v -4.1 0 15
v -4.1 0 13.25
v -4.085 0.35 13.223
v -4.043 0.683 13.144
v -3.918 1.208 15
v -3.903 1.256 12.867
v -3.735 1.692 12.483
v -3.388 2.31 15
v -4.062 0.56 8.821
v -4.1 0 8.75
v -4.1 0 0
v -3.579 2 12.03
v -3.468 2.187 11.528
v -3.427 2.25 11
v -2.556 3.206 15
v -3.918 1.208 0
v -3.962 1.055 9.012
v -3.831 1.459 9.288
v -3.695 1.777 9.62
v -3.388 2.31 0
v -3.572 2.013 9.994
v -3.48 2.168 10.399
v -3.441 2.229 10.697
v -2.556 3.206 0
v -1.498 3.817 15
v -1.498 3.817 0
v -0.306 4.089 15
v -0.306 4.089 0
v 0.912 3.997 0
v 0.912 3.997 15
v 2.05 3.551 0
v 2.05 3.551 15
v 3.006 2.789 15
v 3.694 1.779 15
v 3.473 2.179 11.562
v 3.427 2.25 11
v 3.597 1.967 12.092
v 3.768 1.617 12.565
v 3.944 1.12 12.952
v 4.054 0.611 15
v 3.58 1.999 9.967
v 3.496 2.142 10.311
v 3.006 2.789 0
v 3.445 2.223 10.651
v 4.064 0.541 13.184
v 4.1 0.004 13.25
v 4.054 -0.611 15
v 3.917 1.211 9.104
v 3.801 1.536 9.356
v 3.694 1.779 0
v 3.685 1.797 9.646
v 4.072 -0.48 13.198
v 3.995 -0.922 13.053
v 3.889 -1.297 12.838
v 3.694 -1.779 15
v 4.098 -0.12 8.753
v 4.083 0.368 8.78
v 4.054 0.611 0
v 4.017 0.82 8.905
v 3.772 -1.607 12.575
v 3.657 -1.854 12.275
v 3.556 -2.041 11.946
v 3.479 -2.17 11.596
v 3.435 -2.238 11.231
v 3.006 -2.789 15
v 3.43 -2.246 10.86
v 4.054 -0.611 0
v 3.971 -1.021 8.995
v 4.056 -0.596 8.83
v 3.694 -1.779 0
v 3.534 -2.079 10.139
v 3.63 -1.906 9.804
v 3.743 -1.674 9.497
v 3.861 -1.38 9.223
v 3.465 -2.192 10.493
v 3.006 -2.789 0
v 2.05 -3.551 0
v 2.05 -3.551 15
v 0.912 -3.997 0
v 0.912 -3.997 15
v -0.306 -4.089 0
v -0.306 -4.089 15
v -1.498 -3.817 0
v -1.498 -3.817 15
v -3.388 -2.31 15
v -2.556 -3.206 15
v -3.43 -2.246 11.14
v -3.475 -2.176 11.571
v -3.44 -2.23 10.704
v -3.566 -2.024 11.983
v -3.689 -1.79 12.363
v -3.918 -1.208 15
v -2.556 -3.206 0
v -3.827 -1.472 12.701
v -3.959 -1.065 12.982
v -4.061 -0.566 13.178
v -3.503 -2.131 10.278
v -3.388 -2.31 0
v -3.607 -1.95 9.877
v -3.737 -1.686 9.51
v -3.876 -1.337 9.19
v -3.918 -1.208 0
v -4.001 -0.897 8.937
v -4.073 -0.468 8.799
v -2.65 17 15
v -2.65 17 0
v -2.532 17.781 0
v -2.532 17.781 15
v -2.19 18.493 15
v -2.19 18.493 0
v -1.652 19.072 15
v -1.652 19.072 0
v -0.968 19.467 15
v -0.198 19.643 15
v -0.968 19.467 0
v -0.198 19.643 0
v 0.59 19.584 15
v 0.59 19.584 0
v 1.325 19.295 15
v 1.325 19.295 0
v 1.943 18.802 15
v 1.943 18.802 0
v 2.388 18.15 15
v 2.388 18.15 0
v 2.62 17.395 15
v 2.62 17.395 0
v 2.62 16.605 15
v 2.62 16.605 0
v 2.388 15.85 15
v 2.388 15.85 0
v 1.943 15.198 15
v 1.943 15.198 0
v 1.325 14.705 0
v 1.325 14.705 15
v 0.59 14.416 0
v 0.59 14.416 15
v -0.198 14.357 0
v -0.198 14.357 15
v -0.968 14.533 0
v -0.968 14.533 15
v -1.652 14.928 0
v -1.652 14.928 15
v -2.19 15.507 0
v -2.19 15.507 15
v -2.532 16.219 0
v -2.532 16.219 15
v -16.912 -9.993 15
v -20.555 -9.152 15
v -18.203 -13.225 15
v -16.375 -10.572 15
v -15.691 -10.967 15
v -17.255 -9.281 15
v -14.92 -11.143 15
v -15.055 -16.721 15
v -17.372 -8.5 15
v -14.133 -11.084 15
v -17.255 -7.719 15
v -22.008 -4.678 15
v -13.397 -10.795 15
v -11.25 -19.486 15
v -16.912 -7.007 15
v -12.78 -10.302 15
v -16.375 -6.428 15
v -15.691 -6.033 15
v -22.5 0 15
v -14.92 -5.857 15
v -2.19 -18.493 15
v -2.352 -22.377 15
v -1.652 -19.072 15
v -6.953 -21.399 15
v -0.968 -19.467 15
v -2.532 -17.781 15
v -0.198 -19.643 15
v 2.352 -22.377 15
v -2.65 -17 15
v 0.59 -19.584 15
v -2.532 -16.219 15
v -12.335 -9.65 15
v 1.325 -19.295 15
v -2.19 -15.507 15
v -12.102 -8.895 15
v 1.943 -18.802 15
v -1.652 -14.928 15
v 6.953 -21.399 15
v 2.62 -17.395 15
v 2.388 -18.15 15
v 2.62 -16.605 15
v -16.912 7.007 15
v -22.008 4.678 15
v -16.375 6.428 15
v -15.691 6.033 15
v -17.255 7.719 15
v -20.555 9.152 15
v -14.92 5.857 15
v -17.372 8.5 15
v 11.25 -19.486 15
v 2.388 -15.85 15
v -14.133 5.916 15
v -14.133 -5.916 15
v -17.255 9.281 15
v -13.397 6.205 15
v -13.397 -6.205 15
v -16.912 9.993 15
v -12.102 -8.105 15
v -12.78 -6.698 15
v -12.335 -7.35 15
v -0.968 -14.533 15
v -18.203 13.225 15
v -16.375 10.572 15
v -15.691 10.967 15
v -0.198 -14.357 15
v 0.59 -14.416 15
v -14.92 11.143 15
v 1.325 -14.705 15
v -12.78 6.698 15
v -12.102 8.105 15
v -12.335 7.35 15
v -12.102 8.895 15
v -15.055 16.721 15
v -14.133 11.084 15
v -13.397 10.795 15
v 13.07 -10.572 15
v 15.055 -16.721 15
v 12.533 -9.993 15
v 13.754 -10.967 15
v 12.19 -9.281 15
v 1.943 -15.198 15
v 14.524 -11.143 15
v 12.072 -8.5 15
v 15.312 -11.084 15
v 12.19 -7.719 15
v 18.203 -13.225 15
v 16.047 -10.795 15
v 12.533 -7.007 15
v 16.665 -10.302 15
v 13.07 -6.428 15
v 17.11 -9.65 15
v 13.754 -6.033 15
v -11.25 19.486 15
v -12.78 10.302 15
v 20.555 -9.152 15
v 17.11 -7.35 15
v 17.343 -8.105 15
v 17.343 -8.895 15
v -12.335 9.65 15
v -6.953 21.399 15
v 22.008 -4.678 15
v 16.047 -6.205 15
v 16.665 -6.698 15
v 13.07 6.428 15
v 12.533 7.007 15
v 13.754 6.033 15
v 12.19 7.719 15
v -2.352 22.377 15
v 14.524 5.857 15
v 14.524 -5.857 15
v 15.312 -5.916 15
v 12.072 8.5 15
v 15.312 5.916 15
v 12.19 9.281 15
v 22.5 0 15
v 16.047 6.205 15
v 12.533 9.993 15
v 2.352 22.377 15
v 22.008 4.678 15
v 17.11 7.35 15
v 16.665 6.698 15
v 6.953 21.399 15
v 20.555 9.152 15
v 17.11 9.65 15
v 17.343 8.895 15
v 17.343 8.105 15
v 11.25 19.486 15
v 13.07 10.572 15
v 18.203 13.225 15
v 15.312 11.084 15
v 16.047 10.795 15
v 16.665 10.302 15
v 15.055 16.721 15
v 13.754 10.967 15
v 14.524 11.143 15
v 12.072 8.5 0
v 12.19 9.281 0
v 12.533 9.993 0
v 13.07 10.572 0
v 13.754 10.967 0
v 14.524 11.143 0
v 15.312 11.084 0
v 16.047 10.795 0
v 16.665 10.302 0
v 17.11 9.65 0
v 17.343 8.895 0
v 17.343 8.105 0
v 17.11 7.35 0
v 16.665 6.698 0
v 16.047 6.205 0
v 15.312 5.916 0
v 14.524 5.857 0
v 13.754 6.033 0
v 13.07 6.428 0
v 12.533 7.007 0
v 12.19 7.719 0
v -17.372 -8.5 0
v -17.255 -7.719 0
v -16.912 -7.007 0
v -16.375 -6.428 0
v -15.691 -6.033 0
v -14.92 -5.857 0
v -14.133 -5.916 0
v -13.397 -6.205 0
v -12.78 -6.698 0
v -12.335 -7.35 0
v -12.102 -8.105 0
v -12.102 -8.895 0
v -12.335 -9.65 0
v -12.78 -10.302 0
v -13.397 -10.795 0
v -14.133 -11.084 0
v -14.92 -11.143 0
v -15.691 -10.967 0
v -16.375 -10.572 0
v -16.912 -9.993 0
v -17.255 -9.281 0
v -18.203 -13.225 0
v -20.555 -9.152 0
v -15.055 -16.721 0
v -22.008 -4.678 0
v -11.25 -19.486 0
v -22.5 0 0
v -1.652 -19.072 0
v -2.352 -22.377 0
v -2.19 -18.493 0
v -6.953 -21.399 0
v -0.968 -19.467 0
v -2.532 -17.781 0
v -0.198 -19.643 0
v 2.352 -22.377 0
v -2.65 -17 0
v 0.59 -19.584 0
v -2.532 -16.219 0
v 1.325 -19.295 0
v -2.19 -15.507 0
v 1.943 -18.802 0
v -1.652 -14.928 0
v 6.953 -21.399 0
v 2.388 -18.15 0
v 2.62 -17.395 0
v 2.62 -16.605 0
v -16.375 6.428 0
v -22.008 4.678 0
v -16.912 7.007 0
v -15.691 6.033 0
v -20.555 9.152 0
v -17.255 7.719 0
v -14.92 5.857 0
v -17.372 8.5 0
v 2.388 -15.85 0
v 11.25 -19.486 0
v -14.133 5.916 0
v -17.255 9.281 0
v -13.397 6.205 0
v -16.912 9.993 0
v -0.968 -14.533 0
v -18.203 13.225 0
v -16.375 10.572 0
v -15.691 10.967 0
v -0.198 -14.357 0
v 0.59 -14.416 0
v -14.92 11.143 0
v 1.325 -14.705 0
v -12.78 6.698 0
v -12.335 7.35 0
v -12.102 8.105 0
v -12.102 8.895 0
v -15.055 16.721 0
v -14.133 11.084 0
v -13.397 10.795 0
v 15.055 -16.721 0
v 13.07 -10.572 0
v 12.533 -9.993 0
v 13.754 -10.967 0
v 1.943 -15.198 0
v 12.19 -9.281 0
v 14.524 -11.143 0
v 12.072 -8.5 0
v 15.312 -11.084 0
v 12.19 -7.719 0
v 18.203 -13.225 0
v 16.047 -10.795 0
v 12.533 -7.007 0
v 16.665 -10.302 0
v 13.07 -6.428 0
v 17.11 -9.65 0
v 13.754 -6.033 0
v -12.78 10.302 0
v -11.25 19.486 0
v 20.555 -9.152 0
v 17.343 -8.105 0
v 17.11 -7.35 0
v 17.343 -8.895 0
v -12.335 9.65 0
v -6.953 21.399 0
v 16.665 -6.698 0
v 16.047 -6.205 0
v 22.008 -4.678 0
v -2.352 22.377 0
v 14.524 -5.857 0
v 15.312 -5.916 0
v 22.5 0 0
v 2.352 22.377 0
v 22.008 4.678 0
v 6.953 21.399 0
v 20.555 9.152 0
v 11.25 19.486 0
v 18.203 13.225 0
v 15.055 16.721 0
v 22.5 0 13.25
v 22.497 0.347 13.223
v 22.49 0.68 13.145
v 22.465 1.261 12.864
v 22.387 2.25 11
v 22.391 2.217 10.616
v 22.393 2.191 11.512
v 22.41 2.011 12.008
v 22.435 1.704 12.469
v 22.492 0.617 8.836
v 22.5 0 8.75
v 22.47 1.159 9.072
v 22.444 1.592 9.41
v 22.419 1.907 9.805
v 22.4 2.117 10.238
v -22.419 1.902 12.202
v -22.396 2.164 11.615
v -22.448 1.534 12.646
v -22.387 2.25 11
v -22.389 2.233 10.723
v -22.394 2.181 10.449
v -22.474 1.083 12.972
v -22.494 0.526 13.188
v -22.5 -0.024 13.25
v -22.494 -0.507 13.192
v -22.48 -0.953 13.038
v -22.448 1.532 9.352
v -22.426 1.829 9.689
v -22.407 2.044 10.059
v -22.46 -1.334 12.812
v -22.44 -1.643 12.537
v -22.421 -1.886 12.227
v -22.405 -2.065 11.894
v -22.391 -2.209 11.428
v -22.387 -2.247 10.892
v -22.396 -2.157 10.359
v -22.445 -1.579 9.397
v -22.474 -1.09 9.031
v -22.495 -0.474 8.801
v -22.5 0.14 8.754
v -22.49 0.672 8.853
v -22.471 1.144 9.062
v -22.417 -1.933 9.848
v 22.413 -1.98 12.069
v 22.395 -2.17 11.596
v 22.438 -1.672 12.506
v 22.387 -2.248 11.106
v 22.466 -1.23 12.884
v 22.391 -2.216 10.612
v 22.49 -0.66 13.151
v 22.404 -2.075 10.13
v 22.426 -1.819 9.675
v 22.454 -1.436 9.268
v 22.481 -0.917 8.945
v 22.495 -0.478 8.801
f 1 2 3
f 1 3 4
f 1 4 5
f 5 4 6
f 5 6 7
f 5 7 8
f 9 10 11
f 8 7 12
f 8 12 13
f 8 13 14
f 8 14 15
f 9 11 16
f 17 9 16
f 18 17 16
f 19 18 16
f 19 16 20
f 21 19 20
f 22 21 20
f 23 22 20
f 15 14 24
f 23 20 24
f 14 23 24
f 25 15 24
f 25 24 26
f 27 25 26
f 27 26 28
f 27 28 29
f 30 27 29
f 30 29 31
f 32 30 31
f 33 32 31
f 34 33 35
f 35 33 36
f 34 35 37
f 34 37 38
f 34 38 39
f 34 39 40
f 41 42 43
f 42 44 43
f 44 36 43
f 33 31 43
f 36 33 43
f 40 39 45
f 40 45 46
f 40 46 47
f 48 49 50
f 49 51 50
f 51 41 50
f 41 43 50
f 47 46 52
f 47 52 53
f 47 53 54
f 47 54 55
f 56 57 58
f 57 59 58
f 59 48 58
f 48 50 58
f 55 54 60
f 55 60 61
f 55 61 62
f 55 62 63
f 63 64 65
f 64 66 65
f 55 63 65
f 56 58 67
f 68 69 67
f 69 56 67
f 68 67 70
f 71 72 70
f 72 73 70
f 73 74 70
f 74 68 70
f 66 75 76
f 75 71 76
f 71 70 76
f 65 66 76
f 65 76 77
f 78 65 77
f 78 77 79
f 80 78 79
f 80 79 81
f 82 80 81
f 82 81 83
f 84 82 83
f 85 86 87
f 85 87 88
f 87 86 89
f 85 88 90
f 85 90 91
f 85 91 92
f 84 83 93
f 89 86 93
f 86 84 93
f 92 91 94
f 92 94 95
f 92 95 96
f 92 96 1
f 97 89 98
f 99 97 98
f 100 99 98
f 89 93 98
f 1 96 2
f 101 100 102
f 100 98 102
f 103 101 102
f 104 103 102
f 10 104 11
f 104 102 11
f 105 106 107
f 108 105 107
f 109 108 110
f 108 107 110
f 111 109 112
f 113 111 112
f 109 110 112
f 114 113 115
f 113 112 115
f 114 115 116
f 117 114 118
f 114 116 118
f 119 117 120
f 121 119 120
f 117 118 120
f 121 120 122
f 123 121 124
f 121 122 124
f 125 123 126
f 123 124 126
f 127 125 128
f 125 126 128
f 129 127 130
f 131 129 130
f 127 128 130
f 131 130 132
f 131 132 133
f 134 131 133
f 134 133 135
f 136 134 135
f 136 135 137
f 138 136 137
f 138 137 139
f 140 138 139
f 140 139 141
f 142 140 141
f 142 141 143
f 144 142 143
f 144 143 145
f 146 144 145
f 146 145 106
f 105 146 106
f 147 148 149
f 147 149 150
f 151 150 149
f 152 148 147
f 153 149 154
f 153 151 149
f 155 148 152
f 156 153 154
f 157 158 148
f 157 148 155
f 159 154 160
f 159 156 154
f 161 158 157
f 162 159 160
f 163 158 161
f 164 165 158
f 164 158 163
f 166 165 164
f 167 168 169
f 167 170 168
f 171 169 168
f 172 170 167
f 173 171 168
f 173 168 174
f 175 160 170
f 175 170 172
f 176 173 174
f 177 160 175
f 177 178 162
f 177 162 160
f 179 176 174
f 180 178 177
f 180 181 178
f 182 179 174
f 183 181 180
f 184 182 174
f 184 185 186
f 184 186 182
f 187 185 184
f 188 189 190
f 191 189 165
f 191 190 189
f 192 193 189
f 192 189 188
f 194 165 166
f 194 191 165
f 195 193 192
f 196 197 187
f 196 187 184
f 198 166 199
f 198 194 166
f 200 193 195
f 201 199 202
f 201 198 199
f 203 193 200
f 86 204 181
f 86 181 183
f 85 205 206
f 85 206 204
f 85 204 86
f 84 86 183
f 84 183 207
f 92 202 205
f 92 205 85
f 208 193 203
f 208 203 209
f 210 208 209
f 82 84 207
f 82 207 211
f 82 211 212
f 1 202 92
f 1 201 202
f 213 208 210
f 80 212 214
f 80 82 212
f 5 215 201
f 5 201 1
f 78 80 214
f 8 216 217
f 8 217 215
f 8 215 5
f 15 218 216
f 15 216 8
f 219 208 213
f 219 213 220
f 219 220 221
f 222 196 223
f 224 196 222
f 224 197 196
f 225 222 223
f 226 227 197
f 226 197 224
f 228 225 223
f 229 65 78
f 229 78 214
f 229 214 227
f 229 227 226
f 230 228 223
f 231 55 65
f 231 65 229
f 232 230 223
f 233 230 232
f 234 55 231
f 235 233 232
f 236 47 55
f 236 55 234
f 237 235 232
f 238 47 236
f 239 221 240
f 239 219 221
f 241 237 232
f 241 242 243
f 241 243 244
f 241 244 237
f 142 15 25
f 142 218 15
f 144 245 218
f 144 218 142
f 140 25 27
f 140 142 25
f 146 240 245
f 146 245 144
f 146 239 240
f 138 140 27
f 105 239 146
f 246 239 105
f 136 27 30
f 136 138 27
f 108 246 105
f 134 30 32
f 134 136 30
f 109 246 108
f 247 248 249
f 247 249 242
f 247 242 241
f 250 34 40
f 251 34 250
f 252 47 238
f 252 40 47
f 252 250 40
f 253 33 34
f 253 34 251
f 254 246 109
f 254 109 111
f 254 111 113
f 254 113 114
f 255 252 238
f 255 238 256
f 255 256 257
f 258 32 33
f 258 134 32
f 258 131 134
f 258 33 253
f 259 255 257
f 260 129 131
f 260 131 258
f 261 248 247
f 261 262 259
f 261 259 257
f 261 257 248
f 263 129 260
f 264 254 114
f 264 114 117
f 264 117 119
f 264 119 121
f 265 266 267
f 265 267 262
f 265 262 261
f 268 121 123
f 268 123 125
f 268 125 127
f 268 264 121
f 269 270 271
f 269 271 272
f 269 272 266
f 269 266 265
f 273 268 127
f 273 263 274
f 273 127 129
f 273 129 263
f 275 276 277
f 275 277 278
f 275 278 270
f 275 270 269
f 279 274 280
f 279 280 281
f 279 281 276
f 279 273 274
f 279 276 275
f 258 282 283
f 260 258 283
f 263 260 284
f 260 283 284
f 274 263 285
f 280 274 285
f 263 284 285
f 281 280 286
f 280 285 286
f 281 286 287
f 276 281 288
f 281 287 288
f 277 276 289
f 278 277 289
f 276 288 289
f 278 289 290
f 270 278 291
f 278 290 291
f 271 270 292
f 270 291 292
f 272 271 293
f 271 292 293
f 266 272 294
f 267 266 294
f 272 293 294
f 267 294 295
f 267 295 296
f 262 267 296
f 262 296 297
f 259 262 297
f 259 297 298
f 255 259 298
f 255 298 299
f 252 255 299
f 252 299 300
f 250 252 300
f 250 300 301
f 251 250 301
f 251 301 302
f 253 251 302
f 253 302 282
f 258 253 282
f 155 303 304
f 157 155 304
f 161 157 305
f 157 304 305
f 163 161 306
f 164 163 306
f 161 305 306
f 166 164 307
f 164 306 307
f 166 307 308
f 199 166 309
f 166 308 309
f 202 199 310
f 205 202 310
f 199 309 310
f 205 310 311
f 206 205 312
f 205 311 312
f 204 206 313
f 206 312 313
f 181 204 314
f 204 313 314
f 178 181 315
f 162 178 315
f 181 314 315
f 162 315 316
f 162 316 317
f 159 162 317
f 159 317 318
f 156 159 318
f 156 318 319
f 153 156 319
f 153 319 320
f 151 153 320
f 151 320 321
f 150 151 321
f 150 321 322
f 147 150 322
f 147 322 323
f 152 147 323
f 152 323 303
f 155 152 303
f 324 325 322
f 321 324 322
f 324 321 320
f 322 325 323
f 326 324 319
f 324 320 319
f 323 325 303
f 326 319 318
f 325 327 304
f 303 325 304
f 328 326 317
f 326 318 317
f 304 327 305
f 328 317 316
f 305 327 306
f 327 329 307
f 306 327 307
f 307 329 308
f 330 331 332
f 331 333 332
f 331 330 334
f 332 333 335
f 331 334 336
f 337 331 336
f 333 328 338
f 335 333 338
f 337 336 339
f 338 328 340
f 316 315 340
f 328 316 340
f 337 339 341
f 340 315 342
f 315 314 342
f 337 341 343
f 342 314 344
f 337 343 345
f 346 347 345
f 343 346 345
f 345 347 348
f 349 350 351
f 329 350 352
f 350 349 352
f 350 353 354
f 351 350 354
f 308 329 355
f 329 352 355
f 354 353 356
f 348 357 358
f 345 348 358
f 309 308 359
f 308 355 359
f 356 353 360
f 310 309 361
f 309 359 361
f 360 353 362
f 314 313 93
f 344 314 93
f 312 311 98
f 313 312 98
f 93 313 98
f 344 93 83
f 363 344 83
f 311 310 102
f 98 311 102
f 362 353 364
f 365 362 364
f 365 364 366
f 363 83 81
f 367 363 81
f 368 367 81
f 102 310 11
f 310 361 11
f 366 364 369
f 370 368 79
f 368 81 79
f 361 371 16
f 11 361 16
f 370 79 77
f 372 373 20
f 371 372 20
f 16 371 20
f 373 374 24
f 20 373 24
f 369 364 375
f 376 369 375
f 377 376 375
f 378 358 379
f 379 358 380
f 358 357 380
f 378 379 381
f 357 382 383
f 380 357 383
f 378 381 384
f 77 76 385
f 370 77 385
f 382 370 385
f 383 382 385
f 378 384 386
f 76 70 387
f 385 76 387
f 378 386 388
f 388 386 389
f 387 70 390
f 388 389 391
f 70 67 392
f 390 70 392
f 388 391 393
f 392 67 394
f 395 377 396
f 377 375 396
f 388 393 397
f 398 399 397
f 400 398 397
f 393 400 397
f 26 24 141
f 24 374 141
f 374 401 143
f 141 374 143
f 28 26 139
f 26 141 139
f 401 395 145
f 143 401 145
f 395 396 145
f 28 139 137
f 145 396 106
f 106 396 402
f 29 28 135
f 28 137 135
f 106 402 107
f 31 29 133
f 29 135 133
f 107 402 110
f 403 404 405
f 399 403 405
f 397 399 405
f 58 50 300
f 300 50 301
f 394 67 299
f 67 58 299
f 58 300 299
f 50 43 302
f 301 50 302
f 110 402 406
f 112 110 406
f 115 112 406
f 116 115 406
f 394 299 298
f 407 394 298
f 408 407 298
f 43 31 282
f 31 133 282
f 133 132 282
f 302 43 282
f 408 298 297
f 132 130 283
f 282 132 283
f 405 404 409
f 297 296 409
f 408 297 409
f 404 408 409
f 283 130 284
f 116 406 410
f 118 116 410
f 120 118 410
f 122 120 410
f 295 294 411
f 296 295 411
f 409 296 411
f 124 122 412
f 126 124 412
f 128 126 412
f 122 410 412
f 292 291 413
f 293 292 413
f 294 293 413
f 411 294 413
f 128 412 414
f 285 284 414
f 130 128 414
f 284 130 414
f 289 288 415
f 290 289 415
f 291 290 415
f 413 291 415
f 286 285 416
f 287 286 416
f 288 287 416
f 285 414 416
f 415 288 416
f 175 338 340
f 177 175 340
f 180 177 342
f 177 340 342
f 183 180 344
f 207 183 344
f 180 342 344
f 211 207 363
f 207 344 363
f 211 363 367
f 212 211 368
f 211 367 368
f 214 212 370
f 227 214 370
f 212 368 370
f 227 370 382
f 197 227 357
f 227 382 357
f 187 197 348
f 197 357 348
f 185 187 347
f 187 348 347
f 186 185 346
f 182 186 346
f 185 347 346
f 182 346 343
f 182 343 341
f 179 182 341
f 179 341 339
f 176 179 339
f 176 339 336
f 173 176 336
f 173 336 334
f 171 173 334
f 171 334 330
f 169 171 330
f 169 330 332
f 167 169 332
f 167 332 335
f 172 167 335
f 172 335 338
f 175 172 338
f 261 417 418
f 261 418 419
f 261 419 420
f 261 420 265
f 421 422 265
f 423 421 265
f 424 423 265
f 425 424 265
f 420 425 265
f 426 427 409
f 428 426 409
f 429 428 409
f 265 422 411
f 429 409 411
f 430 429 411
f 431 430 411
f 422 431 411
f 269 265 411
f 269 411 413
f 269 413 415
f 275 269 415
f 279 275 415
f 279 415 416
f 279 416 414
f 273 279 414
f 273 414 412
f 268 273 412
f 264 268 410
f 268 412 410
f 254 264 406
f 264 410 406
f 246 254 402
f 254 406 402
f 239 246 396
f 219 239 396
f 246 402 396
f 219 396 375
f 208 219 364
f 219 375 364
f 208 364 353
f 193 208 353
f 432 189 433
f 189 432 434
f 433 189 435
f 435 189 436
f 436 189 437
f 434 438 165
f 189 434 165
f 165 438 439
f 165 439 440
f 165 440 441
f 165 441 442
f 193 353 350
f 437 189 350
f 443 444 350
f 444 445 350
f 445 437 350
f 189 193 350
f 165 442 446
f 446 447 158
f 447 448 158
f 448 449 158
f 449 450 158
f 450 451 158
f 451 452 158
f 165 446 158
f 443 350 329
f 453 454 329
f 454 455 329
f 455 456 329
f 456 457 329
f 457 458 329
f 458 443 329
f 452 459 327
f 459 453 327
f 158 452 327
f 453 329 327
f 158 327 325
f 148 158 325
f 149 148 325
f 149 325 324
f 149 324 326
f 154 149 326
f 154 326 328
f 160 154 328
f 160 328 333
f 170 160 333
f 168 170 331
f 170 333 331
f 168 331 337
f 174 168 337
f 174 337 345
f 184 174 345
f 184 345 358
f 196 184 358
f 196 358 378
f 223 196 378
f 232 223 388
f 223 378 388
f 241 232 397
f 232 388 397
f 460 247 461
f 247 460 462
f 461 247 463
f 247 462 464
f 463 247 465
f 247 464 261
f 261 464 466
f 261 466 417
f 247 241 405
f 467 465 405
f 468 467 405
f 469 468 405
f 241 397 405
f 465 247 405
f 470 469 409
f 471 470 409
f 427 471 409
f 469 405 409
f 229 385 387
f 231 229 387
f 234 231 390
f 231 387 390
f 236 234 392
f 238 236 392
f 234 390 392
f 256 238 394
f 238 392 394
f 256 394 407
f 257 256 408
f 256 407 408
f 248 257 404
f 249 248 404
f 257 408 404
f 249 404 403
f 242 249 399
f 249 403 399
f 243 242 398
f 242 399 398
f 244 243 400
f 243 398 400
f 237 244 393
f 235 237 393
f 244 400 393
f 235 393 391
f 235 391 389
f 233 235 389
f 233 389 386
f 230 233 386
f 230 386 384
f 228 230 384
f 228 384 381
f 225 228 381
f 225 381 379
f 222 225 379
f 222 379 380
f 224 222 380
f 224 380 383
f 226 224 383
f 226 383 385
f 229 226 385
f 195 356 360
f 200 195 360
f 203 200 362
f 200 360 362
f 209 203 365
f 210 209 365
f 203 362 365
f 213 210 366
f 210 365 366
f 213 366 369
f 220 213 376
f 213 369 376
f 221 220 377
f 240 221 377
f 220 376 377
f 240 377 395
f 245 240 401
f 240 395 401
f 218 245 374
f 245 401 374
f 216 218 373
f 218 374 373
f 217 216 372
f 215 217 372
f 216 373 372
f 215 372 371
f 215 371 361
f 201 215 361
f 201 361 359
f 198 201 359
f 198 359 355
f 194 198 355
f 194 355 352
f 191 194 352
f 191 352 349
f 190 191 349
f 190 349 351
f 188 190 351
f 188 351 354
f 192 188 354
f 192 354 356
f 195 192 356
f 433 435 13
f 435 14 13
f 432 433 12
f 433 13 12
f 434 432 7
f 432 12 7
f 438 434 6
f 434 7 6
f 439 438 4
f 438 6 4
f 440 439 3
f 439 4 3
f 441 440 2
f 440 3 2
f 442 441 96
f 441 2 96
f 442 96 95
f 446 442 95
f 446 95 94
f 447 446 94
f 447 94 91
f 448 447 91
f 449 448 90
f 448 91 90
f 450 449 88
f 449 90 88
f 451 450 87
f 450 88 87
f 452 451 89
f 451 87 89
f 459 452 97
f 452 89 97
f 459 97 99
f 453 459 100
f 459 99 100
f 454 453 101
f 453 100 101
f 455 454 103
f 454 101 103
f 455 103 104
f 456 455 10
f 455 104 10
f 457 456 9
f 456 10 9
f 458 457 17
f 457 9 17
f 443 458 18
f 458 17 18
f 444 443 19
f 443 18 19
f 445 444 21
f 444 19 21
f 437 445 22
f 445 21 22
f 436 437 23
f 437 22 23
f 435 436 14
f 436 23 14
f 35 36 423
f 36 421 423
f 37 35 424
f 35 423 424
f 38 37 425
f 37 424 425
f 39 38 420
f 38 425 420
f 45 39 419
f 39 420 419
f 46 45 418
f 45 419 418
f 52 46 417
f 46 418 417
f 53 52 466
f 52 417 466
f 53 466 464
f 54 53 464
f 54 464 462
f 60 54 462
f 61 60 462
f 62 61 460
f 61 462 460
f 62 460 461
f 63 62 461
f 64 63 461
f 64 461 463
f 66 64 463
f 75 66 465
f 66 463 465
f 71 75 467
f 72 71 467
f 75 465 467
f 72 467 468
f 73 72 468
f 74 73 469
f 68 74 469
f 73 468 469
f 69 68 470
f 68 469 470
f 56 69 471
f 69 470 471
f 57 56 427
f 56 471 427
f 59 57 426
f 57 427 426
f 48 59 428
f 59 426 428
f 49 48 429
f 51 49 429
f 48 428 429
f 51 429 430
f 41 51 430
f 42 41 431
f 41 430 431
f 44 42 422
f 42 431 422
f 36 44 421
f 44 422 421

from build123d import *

# Parameters (mm, degrees)
F0_R     = 22.5
F1_DEPTH = 15
F3_D     = 8.2
F5_D     = 5.3
F6_R     = 2.25
F7_DEPTH = 50


with BuildPart() as f1:
    # F0 (on Top) → F1 (new body)
    with BuildSketch(Plane.XY):
        Circle(F0_R)
    extrude(amount=F1_DEPTH)

    # F3 (through all)
    with Locations(Plane.XY.offset(15)):
        with Locations((0, 0)):
            Hole(F3_D / 2)

    # F5 (through all)
    with Locations(Plane.XY.offset(15)):
        with Locations((0, 17), (14.722432, 8.5), (14.722432, -8.5), (0, -17), (-14.722432, -8.5), (-14.722432, 8.5)):
            Hole(F5_D / 2)

    # F6 (on Right) → F7 (cut, symmetric)
    with BuildSketch(Plane.YZ):
        with Locations((0, 11)):
            Circle(F6_R)
    extrude(amount=F7_DEPTH, both=True, mode=Mode.SUBTRACT)


solid = f1.part
